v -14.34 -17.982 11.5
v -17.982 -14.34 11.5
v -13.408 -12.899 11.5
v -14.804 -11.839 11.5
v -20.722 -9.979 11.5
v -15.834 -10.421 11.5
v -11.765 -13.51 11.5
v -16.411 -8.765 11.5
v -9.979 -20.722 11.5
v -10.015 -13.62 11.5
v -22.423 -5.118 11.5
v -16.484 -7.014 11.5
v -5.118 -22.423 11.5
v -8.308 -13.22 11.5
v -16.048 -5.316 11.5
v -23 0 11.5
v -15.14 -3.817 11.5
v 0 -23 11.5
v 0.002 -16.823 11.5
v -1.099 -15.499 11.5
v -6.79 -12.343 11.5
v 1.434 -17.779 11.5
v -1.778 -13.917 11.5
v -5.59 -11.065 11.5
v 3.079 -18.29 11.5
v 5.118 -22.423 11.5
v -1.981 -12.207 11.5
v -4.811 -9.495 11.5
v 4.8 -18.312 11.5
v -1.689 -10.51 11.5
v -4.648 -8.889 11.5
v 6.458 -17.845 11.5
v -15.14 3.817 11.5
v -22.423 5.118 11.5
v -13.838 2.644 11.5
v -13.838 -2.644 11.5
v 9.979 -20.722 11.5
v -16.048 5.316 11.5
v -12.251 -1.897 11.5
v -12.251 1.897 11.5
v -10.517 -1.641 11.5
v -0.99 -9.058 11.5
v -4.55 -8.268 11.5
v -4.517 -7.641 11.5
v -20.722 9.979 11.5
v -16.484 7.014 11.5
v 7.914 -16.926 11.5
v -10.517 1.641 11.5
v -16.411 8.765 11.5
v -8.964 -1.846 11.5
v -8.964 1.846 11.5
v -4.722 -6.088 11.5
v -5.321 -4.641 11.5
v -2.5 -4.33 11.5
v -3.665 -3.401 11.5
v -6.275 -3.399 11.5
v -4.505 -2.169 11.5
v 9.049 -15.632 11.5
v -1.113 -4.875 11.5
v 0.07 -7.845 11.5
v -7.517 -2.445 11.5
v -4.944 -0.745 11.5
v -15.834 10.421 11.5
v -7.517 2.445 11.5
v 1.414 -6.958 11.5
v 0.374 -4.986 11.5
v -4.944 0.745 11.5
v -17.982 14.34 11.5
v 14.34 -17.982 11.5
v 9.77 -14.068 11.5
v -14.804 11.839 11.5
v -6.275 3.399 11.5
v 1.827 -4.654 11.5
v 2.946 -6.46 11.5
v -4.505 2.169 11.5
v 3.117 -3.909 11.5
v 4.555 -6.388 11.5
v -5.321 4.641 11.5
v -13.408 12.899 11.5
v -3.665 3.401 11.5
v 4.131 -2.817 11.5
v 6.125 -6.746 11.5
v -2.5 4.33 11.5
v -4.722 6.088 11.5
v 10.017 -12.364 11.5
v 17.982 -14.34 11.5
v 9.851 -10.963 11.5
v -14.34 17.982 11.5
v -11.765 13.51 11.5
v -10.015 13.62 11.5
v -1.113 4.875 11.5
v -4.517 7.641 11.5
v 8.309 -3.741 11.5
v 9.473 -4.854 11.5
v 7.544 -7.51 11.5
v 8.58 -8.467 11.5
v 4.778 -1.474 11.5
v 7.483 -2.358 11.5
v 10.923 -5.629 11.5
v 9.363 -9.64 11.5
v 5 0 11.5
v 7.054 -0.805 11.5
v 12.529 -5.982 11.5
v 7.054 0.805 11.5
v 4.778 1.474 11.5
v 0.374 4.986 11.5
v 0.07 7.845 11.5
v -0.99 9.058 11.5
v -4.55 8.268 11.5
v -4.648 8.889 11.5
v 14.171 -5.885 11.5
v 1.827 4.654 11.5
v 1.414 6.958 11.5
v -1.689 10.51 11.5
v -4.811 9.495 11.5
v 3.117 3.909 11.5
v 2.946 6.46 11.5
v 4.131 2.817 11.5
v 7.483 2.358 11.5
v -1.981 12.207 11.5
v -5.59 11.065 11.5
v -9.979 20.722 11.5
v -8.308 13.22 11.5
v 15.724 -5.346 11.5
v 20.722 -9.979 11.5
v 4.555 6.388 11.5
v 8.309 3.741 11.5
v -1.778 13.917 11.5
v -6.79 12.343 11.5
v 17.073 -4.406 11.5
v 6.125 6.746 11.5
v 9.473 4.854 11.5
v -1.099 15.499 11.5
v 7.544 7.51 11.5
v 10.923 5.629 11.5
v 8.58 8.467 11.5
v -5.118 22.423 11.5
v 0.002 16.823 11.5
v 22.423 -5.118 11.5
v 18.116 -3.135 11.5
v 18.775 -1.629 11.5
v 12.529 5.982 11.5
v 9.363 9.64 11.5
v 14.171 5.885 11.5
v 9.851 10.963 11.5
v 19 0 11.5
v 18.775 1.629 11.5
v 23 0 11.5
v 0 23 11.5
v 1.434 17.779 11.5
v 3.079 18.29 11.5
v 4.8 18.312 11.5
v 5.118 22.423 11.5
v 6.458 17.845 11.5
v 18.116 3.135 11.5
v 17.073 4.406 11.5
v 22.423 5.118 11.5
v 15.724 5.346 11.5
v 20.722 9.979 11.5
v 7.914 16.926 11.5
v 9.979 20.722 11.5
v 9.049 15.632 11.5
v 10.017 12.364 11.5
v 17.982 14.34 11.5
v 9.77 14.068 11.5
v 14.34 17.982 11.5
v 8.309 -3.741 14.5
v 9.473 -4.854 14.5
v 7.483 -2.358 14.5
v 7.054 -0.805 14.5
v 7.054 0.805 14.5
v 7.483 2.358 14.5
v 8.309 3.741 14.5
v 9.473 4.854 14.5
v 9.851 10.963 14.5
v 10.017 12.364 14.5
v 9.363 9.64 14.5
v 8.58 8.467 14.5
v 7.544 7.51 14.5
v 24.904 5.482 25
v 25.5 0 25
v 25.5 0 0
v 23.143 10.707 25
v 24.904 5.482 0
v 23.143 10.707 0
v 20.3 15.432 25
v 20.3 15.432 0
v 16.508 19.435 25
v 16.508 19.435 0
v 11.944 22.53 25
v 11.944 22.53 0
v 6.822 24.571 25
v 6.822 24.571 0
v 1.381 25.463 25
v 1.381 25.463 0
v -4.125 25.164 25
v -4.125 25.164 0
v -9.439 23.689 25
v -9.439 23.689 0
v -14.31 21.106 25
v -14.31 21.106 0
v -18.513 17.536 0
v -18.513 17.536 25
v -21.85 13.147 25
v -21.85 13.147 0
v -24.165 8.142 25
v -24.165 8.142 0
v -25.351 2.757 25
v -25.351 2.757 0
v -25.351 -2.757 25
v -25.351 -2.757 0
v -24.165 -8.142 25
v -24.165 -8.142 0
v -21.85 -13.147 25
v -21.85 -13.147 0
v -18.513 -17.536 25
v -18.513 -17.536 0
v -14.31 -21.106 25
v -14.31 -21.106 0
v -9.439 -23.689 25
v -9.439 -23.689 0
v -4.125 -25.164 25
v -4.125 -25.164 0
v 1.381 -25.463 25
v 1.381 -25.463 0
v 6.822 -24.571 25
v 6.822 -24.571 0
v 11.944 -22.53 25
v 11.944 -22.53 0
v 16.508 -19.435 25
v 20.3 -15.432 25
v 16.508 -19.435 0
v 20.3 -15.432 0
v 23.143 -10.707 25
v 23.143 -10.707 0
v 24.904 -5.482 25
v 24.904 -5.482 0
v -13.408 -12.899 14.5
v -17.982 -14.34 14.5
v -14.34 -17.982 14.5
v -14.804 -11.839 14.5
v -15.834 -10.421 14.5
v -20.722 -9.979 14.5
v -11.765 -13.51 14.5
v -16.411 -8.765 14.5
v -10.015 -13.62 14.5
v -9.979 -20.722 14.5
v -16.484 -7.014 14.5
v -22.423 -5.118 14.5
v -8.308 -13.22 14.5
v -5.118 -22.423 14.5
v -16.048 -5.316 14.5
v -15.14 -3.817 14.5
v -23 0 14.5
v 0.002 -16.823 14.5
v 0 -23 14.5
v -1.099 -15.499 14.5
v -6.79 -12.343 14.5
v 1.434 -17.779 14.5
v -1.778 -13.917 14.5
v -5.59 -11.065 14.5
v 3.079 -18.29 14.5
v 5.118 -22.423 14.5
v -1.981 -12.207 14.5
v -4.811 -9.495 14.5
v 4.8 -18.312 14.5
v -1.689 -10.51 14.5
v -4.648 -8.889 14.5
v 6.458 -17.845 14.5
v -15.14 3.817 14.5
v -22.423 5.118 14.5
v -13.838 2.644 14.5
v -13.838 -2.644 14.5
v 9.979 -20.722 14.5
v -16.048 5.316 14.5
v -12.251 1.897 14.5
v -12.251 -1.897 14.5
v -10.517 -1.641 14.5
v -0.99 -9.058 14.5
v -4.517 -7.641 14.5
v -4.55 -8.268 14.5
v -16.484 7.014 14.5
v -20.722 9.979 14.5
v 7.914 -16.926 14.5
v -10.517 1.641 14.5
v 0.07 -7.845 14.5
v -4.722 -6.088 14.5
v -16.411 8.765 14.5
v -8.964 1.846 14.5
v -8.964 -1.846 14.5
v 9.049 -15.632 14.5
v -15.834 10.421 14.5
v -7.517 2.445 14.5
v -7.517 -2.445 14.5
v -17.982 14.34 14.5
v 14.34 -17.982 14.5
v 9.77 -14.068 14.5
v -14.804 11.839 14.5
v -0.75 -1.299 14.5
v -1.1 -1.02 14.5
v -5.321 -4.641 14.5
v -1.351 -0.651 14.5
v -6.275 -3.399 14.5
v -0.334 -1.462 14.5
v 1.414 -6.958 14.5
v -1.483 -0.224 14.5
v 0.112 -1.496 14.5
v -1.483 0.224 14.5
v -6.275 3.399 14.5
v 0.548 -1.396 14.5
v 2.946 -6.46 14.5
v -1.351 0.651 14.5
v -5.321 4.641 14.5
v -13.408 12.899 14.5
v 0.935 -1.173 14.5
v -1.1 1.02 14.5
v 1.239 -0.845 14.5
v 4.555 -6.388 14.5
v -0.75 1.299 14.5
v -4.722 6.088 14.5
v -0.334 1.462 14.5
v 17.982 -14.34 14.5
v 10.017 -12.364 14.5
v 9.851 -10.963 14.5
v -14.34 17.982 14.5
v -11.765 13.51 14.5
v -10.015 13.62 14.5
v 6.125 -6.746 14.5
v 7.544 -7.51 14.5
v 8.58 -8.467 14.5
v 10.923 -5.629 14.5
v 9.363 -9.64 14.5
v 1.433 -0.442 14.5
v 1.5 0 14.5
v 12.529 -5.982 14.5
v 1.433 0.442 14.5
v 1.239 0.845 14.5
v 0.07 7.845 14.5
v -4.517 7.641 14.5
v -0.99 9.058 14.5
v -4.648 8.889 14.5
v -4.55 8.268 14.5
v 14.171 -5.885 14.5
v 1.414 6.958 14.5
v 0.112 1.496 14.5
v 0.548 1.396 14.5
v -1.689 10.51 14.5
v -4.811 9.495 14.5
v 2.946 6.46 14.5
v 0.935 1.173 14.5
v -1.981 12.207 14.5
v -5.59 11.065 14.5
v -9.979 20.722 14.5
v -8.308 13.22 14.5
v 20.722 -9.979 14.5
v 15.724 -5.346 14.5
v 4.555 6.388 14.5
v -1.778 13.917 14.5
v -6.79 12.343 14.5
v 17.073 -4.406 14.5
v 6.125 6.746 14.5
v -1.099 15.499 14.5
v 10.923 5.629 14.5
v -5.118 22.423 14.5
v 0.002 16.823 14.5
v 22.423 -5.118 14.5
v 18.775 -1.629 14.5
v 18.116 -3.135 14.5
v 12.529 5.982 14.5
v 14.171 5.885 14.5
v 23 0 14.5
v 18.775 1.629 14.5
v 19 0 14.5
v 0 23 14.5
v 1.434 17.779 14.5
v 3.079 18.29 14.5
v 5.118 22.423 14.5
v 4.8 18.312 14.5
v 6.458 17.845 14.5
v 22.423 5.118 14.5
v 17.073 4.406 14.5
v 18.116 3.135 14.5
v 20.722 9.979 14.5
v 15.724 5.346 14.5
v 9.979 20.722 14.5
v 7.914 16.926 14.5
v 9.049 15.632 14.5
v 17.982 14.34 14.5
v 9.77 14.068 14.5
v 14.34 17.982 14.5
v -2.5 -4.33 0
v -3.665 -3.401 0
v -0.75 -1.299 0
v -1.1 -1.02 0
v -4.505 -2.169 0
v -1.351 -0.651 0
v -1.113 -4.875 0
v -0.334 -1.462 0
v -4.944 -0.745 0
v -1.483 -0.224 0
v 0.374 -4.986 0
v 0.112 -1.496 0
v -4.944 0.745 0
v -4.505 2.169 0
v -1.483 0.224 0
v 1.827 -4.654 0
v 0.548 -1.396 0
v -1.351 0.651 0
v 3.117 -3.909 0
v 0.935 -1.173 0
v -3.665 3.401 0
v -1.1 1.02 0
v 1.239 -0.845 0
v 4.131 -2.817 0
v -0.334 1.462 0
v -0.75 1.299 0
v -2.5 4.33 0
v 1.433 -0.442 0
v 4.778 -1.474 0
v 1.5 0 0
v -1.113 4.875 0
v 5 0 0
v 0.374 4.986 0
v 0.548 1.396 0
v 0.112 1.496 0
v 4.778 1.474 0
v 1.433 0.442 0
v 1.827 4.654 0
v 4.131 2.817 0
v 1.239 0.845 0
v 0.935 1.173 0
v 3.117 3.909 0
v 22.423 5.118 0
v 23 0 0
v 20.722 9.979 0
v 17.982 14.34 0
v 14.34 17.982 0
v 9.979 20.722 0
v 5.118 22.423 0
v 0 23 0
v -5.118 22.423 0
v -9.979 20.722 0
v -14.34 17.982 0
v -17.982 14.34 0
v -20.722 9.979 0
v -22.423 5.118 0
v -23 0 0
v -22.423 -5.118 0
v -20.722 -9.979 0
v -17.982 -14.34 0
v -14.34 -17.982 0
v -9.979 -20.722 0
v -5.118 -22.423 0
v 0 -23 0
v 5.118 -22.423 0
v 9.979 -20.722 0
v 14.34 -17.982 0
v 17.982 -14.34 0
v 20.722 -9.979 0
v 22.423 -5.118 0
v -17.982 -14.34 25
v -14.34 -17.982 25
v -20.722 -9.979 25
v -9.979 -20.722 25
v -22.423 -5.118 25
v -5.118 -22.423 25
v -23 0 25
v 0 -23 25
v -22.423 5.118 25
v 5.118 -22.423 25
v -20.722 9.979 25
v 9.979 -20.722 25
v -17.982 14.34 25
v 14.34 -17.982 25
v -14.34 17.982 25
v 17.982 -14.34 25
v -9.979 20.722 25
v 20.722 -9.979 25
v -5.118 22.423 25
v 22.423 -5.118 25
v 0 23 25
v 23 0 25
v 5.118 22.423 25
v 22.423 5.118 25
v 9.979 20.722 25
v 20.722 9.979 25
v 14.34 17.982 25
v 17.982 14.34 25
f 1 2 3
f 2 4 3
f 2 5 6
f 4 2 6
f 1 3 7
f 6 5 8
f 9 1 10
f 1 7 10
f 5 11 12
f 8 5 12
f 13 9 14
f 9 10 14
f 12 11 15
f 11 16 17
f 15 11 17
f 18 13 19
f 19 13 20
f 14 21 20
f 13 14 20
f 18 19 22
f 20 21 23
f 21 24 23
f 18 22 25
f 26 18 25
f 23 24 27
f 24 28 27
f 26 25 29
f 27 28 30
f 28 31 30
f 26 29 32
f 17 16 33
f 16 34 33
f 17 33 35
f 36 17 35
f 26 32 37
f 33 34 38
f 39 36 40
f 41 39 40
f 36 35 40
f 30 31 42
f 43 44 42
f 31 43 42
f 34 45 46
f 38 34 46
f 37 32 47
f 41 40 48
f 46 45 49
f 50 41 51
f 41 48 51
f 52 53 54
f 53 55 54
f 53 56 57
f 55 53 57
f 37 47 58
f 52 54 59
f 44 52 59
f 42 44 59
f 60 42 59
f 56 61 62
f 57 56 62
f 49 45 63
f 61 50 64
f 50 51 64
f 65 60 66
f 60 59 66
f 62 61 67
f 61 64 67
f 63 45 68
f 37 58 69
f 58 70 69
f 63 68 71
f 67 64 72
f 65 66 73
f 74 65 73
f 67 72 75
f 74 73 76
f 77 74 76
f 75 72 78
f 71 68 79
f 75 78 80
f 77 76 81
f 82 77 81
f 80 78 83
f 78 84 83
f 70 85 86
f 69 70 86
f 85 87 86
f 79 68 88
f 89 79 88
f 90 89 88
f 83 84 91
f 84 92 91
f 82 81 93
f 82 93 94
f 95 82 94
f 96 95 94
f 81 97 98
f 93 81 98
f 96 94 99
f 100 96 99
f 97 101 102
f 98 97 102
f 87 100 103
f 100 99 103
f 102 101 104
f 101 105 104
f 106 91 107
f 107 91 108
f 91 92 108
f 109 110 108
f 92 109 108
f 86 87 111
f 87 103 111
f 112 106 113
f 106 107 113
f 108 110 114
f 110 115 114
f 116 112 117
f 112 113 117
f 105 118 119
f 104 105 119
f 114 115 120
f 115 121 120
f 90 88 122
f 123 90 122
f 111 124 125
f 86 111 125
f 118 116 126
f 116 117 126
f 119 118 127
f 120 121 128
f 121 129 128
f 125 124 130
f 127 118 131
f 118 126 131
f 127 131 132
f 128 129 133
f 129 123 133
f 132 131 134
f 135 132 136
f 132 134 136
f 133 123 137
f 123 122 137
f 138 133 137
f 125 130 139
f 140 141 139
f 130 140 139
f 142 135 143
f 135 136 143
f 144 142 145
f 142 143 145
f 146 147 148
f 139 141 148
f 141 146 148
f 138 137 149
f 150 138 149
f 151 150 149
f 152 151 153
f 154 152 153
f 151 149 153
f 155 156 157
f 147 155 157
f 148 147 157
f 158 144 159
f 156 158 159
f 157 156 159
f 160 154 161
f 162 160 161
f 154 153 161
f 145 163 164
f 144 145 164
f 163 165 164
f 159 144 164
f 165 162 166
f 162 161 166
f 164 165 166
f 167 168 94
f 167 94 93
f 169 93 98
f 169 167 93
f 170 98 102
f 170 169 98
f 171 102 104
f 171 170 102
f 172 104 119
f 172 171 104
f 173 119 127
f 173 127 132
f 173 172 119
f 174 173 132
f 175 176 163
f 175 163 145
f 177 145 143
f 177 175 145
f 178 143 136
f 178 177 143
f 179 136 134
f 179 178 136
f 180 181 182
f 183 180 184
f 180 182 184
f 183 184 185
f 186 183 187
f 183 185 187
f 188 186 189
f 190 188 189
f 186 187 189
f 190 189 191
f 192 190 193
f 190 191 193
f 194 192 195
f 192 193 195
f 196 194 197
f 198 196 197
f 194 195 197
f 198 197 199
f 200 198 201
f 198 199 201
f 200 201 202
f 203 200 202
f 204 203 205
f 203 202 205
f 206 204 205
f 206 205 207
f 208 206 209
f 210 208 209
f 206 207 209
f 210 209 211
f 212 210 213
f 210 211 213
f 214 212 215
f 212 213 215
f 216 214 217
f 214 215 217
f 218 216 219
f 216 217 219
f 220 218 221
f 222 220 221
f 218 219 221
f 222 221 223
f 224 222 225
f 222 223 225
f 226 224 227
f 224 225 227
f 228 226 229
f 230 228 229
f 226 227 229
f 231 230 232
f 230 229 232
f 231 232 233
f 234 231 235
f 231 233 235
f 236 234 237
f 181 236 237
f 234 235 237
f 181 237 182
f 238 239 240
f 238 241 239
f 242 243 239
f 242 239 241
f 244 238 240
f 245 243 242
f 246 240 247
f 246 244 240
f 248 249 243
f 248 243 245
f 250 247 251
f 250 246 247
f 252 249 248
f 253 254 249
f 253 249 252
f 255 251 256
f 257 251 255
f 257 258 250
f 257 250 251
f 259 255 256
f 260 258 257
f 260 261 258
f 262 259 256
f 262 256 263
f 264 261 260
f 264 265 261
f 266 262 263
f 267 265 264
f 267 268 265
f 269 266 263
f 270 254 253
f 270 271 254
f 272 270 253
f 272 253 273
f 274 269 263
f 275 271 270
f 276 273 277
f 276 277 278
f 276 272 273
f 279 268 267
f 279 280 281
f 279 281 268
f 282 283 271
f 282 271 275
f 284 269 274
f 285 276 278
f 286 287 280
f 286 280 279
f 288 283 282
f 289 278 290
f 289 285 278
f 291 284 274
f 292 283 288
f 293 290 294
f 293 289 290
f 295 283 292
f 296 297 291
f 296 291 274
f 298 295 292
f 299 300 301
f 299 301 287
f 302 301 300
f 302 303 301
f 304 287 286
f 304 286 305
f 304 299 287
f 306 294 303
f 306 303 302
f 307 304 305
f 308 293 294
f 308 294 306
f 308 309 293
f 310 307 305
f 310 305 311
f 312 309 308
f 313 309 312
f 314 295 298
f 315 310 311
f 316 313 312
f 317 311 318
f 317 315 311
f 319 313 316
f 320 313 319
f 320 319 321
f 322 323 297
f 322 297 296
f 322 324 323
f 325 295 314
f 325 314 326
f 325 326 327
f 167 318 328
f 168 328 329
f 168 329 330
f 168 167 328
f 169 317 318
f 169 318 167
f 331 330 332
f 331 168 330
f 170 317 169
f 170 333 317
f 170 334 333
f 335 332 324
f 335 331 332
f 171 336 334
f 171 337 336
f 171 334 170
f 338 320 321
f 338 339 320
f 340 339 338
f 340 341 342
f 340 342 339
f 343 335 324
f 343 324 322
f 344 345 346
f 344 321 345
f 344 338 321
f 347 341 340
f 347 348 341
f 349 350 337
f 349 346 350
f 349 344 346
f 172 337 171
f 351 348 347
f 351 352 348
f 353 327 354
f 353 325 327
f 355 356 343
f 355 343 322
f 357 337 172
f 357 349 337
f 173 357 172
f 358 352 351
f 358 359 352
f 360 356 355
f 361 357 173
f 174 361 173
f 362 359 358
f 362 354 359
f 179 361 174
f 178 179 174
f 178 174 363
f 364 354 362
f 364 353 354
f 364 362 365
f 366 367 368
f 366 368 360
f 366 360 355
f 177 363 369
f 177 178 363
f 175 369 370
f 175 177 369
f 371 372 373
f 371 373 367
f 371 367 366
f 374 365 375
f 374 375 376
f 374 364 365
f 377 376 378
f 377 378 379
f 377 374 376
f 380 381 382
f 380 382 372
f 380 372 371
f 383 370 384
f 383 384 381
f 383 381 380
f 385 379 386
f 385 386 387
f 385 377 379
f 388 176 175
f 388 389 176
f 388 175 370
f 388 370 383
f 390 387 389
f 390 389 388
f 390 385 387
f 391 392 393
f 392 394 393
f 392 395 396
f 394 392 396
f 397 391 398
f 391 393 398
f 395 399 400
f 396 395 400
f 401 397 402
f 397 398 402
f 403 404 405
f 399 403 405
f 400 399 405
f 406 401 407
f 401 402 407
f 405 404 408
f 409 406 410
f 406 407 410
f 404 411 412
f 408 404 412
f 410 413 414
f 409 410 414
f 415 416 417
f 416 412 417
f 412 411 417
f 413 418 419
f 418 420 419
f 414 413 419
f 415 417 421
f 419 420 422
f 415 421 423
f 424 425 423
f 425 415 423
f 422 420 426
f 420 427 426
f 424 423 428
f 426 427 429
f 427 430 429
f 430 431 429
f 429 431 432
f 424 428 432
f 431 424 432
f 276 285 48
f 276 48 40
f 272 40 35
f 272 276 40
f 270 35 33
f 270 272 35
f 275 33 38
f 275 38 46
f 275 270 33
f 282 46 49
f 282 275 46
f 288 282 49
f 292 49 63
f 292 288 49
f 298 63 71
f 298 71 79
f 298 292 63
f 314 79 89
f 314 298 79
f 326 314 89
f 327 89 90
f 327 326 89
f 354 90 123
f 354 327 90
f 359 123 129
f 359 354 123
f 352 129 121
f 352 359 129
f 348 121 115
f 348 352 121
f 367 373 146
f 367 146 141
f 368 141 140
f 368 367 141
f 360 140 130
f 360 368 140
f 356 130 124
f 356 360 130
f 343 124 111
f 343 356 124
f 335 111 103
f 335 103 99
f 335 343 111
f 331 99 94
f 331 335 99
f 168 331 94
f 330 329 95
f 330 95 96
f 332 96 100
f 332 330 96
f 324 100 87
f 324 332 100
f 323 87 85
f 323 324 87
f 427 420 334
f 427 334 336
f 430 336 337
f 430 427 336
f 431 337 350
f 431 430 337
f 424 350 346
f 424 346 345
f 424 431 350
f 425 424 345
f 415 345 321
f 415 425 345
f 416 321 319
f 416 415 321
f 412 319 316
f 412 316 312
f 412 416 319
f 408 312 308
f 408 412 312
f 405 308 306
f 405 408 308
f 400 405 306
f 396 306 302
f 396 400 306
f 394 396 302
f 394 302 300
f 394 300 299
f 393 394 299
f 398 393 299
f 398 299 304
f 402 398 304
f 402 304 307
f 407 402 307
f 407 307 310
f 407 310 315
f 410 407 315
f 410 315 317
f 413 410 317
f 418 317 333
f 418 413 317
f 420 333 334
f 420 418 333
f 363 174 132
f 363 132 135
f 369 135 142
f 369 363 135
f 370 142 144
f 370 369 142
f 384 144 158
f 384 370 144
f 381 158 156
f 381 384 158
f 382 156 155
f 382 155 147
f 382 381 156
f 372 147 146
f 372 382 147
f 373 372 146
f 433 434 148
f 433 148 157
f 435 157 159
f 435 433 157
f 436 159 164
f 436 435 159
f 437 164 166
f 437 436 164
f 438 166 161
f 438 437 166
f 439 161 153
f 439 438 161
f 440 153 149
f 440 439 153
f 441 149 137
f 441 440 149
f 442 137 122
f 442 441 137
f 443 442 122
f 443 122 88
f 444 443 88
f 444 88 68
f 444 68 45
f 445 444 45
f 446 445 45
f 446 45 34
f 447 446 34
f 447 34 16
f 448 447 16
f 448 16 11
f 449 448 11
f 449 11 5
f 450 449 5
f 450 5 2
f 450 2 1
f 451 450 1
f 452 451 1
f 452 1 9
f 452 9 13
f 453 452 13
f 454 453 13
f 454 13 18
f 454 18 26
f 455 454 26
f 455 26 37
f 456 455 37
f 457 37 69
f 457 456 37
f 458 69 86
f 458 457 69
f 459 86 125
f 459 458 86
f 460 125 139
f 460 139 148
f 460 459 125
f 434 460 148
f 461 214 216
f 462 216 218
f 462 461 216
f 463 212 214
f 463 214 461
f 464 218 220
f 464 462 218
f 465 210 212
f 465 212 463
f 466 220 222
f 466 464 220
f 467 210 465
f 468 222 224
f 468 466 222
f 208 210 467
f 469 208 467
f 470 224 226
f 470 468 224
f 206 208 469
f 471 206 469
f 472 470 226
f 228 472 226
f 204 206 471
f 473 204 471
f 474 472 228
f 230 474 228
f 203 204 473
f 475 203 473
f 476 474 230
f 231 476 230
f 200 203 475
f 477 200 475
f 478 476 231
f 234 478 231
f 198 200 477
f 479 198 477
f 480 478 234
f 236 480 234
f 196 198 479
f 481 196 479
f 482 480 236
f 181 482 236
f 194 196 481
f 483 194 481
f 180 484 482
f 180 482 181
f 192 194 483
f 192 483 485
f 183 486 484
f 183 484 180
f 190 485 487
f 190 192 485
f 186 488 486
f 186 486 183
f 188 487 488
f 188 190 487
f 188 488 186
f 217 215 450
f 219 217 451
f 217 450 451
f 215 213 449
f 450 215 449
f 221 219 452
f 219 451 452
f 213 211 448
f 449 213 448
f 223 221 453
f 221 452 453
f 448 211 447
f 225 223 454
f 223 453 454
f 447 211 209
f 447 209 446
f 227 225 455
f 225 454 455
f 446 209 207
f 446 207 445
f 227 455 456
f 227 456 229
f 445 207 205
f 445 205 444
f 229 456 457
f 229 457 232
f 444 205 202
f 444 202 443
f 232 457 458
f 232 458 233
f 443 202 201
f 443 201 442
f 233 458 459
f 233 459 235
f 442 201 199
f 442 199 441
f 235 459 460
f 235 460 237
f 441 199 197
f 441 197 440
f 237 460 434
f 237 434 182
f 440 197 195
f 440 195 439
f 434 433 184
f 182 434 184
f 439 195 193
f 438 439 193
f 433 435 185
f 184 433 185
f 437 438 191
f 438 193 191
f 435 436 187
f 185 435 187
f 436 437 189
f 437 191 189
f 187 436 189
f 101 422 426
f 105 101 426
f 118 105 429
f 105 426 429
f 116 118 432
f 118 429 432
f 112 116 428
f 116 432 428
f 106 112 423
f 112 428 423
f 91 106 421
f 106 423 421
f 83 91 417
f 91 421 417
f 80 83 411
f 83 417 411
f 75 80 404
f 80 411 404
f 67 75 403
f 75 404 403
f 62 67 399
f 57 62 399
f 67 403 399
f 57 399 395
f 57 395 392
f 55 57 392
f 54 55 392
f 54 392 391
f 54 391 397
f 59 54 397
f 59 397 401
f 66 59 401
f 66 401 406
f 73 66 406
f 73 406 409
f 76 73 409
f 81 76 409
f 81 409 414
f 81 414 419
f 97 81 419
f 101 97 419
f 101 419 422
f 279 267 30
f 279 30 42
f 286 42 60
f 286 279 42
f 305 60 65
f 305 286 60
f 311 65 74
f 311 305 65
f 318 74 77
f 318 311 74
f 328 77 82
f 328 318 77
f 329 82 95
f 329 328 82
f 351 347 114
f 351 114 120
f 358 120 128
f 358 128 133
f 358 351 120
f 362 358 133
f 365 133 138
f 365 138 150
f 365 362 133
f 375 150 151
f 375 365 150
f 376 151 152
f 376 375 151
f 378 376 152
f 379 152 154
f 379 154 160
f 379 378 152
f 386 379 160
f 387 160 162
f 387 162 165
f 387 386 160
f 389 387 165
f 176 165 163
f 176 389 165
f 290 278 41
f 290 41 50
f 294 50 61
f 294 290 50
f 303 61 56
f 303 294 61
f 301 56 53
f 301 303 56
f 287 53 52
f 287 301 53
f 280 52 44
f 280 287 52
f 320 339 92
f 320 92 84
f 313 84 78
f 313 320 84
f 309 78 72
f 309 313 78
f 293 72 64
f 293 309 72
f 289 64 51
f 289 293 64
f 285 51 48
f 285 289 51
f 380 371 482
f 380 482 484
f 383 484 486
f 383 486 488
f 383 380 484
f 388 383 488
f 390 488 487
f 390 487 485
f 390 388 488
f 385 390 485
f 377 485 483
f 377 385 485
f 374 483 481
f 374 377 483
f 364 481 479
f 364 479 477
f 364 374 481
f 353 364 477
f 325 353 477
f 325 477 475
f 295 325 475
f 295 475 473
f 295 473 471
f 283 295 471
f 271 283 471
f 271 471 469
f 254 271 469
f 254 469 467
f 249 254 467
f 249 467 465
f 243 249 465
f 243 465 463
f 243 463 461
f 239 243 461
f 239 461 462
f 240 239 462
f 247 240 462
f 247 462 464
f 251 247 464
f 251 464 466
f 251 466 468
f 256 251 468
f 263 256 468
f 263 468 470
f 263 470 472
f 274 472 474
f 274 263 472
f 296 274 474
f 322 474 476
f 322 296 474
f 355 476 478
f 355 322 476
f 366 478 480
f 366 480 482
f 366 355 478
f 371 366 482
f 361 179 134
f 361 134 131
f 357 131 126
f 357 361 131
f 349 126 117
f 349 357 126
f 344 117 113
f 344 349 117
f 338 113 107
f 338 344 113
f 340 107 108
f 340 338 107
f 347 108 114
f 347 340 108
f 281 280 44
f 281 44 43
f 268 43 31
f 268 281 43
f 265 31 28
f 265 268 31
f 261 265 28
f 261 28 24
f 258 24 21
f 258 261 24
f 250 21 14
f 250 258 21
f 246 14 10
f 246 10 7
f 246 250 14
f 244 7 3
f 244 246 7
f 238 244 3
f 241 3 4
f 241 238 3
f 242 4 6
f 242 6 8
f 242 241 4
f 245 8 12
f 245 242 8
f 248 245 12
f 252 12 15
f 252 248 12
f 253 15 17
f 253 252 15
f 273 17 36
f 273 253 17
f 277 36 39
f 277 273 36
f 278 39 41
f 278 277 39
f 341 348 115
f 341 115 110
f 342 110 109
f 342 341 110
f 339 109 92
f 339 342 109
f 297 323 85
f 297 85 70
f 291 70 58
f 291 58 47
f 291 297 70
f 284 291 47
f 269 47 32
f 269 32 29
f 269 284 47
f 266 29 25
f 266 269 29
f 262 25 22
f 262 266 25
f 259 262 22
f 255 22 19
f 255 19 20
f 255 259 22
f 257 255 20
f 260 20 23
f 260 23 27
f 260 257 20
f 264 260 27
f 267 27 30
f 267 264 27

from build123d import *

# Parameters (mm, degrees)
F0_R     = 25.5
F0_R_2   = 23
F2_DEPTH = 25
F1_R     = 5
F1_R_2   = 1.5
F3_DEPTH = 14.5
F4_R     = 23
F4_R_2   = 5
F5_DEPTH = 3


with BuildPart() as f2:
    # F0 (on Top) → F2 (new body)
    with BuildSketch(Plane.XY):
        Circle(F0_R)
        Circle(F0_R_2, mode=Mode.SUBTRACT)
    extrude(amount=F2_DEPTH)



with BuildPart() as f3:
    # F1 (on Top) → F3 (new body)
    with BuildSketch(Plane.XY):
        Circle(F1_R)
        Circle(F1_R_2, mode=Mode.SUBTRACT)
    extrude(amount=F3_DEPTH)


with BuildPart() as f2_1:
    add(f2.part)

    add(f3.part)  # F5 merges F3
    # F4 (on face) → F5 (join)
    with BuildSketch(Plane.XY.offset(14.5)):
        Circle(F4_R)
        with BuildLine():
            ThreePointArc((19, 0), (15.723943, -5.346039), (9.473288, -4.854102))
            Line((9.473288, -4.854102), (7.543932, -7.509633))
            ThreePointArc((7.543932, -7.509633), (9.36326, -9.639792), (10.017221, -12.363735))
            ThreePointArc((10.017221, -12.363735), (3.078614, -18.289865), (-1.689118, -10.509633))
            Line((-1.689118, -10.509633), (-4.810882, -9.49531))
            ThreePointArc((-4.810882, -9.49531), (-15.371323, -11.16792), (-10.517221, -1.641208))
            Line((-10.517221, -1.641208), (-10.517221, 1.641208))
            ThreePointArc((-10.517221, 1.641208), (-15.371323, 11.16792), (-4.810882, 9.49531))
            Line((-4.810882, 9.49531), (-1.689118, 10.509633))
            ThreePointArc((-1.689118, 10.509633), (3.078614, 18.289865), (10.017221, 12.363735))
            ThreePointArc((10.017221, 12.363735), (9.36326, 9.639792), (7.543932, 7.509633))
            Line((7.543932, 7.509633), (9.473288, 4.854102))
            ThreePointArc((9.473288, 4.854102), (15.723943, 5.346039), (19, 0))
        make_face(mode=Mode.SUBTRACT)
        with BuildLine():
            Line((7.543932, -7.509633), (9.473288, -4.854102))
            ThreePointArc((9.473288, -4.854102), (7, 0), (9.473288, 4.854102))
            Line((9.473288, 4.854102), (7.543932, 7.509633))
            ThreePointArc((7.543932, 7.509633), (2.163119, 6.657396), (-1.689118, 10.509633))
            Line((-1.689118, 10.509633), (-4.810882, 9.49531))
            ThreePointArc((-4.810882, 9.49531), (-4.591091, 8.579815), (-4.517221, 7.641208))
            ThreePointArc((-4.517221, 7.641208), (-6.27458, 3.398568), (-10.517221, 1.641208))
            Line((-10.517221, 1.641208), (-10.517221, -1.641208))
            ThreePointArc((-10.517221, -1.641208), (-6.27458, -3.398568), (-4.517221, -7.641208))
            ThreePointArc((-4.517221, -7.641208), (-4.591091, -8.579815), (-4.810882, -9.49531))
            Line((-4.810882, -9.49531), (-1.689118, -10.509633))
            ThreePointArc((-1.689118, -10.509633), (2.163119, -6.657396), (7.543932, -7.509633))
        make_face()
        Circle(F4_R_2, mode=Mode.SUBTRACT)
    extrude(amount=-F5_DEPTH)


solid = f2_1.part
